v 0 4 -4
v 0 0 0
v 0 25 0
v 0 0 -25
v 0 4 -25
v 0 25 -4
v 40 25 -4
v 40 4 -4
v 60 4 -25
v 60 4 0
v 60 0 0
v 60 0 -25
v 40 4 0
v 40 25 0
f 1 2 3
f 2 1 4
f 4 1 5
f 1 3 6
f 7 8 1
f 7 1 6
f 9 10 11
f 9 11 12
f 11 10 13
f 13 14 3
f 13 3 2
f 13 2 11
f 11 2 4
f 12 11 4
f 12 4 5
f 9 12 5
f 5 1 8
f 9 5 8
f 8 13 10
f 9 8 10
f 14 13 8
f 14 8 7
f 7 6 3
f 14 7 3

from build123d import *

# Parameters (mm, degrees)
EXTRUDE_1_DEPTH     = 60
SKETCH_2_W          = 20
SKETCH_2_H          = 21
CUT_EXTRUDE_1_DEPTH = 26


with BuildPart() as part:
    # Эскиз1 → Вытянуть-Тонкостенный1 (new body)
    with BuildSketch(Plane(origin=(0, 0, 0), x_dir=(0, 0, -1), z_dir=(1, 0, 0))):
        Polygon((0, 25), (0, 0), (25, 0), (25, 4), (4, 4), (4, 25), align=None)
    extrude(amount=EXTRUDE_1_DEPTH)

    # Эскиз2 → Вырез-Вытянуть1 (cut, through all)
    with BuildSketch(Plane.XY):
        with Locations((50, 14.5)):
            Rectangle(SKETCH_2_W, SKETCH_2_H)
    extrude(amount=-CUT_EXTRUDE_1_DEPTH, mode=Mode.SUBTRACT)


solid = part.part
